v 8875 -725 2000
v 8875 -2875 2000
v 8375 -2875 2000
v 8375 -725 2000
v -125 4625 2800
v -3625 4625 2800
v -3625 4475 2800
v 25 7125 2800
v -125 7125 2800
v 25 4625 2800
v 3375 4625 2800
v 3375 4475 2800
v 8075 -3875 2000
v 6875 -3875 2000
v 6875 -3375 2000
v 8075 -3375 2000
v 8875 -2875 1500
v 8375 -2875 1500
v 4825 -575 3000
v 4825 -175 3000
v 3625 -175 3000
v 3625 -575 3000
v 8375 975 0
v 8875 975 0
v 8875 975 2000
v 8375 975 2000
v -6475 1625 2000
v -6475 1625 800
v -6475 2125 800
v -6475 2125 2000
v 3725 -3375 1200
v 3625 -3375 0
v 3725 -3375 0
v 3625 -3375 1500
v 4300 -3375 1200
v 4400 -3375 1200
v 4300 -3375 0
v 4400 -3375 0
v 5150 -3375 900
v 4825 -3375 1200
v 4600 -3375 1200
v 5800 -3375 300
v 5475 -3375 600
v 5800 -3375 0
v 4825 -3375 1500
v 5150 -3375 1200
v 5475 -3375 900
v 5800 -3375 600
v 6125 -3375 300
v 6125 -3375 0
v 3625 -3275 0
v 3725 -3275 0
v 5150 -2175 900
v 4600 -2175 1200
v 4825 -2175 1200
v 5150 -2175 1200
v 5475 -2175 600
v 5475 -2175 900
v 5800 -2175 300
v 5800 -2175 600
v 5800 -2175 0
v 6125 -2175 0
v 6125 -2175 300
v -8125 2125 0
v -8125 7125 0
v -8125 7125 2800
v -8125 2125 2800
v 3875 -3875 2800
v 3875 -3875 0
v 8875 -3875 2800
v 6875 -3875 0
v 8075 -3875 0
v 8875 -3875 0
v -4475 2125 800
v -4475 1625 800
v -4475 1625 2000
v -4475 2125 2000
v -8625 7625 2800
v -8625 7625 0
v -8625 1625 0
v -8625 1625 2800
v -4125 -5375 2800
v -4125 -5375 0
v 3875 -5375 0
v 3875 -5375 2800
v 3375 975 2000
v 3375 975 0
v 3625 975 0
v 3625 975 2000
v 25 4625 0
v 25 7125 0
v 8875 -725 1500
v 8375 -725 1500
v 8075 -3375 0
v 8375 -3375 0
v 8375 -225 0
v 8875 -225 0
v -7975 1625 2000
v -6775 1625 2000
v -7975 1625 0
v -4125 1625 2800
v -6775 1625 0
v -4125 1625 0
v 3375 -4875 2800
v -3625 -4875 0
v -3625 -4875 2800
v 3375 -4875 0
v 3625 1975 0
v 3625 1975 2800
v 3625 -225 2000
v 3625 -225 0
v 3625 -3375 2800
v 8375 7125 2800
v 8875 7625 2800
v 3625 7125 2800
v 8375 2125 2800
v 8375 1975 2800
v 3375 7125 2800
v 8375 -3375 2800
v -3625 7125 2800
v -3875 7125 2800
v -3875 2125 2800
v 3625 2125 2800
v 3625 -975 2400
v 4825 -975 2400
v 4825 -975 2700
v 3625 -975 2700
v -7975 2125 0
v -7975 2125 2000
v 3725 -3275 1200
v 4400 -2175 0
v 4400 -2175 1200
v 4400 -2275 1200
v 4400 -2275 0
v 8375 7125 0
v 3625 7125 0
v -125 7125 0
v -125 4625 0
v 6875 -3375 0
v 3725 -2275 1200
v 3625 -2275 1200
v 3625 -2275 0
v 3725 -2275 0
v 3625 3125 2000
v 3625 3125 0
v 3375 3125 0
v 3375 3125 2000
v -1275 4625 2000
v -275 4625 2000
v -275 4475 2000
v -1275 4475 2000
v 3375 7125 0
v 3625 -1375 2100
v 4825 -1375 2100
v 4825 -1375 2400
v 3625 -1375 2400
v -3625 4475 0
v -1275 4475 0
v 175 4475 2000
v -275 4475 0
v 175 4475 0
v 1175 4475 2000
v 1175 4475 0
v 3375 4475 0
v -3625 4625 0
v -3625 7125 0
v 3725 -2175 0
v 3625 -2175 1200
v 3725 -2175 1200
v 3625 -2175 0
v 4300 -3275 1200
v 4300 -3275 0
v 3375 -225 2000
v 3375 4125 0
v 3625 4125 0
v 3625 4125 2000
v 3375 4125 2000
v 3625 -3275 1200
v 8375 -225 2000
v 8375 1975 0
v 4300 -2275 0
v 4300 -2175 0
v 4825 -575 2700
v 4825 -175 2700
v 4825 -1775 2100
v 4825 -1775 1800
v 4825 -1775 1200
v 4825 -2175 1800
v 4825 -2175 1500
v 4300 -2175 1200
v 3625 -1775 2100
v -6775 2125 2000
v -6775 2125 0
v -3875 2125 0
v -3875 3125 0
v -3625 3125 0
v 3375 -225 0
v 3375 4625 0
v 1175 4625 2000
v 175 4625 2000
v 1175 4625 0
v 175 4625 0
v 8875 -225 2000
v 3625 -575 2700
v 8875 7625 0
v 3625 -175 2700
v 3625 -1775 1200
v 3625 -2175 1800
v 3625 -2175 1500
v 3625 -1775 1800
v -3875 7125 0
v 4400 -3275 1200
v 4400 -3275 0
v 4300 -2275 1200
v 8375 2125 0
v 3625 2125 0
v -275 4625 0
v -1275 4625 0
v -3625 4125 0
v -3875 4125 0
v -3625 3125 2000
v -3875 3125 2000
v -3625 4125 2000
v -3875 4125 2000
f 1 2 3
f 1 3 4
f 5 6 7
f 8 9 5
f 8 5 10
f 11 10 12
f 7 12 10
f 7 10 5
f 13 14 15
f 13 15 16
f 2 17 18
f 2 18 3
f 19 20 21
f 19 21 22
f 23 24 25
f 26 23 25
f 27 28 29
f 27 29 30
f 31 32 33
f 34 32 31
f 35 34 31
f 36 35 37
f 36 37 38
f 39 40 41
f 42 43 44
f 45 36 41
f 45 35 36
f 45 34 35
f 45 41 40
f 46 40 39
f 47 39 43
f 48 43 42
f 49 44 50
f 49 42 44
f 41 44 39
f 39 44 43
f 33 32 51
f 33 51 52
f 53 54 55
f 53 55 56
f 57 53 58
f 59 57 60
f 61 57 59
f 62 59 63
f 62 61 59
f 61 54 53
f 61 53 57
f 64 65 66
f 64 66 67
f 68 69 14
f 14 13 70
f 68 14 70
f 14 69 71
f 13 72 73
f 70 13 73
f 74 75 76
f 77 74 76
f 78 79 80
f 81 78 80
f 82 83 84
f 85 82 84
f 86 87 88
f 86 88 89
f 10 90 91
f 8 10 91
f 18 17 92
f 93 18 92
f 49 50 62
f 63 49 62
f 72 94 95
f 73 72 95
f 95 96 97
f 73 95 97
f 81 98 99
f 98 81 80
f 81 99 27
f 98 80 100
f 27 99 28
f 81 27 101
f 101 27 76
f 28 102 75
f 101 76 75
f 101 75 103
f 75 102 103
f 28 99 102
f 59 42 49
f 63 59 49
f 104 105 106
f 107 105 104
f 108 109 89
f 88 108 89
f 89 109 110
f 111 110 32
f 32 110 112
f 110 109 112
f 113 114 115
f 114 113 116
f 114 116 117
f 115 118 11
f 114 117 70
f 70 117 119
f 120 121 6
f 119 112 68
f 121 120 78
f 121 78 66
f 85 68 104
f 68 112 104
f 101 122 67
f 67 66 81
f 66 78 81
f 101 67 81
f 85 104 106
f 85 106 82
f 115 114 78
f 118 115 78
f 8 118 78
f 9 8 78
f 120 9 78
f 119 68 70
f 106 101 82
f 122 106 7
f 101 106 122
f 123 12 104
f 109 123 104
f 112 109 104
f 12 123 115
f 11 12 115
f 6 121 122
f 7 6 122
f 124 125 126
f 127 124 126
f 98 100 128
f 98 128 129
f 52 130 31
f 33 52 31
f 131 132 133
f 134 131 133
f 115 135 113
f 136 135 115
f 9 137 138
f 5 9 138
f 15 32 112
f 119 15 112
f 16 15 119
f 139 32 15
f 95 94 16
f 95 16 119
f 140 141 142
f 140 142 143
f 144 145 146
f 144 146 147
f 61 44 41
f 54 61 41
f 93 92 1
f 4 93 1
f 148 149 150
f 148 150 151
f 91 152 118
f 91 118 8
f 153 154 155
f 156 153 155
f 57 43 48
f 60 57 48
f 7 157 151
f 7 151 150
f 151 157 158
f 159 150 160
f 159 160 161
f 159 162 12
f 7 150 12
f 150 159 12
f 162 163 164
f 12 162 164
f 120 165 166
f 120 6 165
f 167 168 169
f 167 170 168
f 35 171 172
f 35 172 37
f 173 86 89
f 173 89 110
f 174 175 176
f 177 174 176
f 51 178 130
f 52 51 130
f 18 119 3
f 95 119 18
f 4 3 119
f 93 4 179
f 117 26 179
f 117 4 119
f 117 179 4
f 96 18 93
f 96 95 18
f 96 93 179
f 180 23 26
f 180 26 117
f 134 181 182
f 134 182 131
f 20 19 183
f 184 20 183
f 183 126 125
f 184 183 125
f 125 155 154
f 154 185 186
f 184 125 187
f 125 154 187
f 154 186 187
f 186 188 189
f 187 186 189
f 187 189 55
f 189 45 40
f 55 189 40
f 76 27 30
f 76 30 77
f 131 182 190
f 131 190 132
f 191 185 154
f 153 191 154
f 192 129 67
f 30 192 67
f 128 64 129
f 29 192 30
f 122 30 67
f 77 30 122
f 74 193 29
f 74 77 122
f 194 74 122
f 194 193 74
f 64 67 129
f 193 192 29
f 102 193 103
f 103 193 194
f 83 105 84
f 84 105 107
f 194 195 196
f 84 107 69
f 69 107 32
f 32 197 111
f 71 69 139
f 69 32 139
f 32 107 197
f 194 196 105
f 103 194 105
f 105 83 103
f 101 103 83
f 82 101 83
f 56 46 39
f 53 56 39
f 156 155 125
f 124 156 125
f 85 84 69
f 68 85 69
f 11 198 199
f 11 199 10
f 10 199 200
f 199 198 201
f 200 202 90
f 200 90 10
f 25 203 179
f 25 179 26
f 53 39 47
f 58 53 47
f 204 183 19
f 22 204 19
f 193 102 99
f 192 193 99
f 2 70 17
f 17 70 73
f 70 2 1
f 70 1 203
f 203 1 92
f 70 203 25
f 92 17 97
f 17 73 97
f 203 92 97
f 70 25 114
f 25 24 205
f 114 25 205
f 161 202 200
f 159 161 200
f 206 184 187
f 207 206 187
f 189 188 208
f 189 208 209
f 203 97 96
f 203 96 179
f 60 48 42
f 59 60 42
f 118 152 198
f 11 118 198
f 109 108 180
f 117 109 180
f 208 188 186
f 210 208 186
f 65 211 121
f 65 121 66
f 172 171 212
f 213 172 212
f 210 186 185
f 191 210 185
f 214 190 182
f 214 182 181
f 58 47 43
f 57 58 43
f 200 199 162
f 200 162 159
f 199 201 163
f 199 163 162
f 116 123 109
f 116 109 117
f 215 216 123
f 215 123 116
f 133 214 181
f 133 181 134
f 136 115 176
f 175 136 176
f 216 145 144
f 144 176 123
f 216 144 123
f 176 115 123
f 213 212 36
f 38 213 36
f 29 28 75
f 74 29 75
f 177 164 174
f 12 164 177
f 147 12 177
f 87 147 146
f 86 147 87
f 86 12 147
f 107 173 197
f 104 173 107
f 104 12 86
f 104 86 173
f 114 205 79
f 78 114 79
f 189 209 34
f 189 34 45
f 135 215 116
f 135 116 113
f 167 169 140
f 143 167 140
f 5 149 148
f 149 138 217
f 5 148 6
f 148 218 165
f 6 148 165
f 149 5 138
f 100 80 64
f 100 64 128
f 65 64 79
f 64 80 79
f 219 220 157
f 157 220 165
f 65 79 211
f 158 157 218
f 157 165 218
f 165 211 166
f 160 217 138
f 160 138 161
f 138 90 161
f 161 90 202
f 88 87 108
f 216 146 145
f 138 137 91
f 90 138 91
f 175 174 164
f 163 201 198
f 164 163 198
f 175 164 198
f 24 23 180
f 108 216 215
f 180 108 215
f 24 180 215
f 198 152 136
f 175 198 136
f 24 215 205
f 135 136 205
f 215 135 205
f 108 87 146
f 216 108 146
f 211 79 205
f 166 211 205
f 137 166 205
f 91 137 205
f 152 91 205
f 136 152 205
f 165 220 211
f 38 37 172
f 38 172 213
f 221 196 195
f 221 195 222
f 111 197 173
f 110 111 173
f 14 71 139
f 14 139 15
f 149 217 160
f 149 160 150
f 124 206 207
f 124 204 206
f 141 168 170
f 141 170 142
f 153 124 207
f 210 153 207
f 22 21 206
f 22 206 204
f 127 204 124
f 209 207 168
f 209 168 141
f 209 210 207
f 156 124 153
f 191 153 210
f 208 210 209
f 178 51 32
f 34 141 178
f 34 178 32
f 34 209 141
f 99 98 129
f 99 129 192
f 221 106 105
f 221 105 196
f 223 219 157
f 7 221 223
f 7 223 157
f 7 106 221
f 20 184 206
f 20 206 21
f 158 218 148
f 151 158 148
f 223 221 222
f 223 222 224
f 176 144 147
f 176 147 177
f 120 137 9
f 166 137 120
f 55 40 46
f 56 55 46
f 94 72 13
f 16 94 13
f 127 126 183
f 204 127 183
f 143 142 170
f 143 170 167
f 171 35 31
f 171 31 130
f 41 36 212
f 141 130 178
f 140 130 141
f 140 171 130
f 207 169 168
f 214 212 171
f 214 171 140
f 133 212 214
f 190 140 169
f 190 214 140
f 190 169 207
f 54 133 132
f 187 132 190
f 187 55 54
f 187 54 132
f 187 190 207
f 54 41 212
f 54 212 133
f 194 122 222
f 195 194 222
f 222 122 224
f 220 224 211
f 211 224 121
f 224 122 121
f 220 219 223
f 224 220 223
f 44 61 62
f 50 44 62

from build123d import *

# Parameters (mm, degrees)
F1_DEPTH  = 2799.9999523163
F3_DEPTH  = 3000
F4_W      = 5000
F4_H      = 2799.9999523163
F5_DEPTH  = 250
F6_W      = 1000
F6_H      = 2000
F7_DEPTH  = 250
F8_W      = 1200
F8_H      = 2000
F9_DEPTH  = 500
F10_W     = 2000
F10_H     = 1200
F11_DEPTH = 500
F12_W     = 10500
F12_H     = 2799.9999523163
F13_DEPTH = 250
F14_W     = 4750
F14_H     = 150
F15_DEPTH = 2800
F16_W     = 1000
F16_H     = 2000
F17_DEPTH = 150
F18_W     = 1000
F18_H     = 2000
F19_DEPTH = 150
F20_W     = 1000
F20_H     = 2000
F21_DEPTH = 250
F22_W     = 1200
F22_H     = 2000
F23_DEPTH = 500
F24_W     = 1200
F24_H     = 2000
F25_DEPTH = 500
F26_W     = 2150
F26_H     = 500
F27_DEPTH = 500
F28_W     = 1200
F28_H     = 2000
F29_DEPTH = 250
F30_W     = 2500
F30_H     = 1200
F31_DEPTH = 1500
F33_DEPTH = 1200
F34_W     = 100
F34_H     = 100
F35_DEPTH = 1400
F36_W     = 1200
F36_H     = 300
F37_DEPTH = 1200
F39_DEPTH = 1200


with BuildPart() as f1:
    # F0 (on Top) → F1 (new body)
    with BuildSketch(Plane.XY):
        Polygon((8875, -3875), (8875, 7625), (-8625, 7625), (-8625, 1625), (-4125, 1625), (-4125, -5375), (3875, -5375), (3875, -3875), align=None)
    extrude(amount=F1_DEPTH)

    # F2 (on Top) → F3 (cut)
    with BuildSketch(Plane.XY):
        Polygon((8375, -3375), (8375, 7125), (-3740.2497768402, 7125), (-8125, 7125), (-8125, 2125), (-3625, 2125), (-3625, -4875), (3375, -4875), (3375, -3375), align=None)
    extrude(amount=F3_DEPTH, mode=Mode.SUBTRACT)

    # F4 (on face) → F5 (join)
    with BuildSketch(Plane.YZ.offset(-3625)):
        with Locations((4625, 1399.9999761581)):
            Rectangle(F4_W, F4_H)
    extrude(amount=-F5_DEPTH)

    # F6 (on face) → F7 (cut, through all)
    with BuildSketch(Plane.YZ.offset(-3625)):
        with Locations((3625, 1000)):
            Rectangle(F6_W, F6_H)
    extrude(amount=-F7_DEPTH, mode=Mode.SUBTRACT)

    # F8 (on face) → F9 (cut, through all)
    with BuildSketch(Plane.XZ.offset(-1625)):
        with Locations((-7375, 1000)):
            Rectangle(F8_W, F8_H)
    extrude(amount=-F9_DEPTH, mode=Mode.SUBTRACT)

    # F10 (on face) → F11 (cut, through all)
    with BuildSketch(Plane.XZ.offset(-1625)):
        with Locations((-5475, 1400)):
            Rectangle(F10_W, F10_H)
    extrude(amount=-F11_DEPTH, mode=Mode.SUBTRACT)

    # F12 (on face) → F13 (join)
    with BuildSketch(Plane(origin=(3375, 0, 0), x_dir=(0, -1, 0), z_dir=(-1, 0, 0))):
        with Locations((-1875, 1399.9999761581)):
            Rectangle(F12_W, F12_H)
    extrude(amount=-F13_DEPTH)

    # F14 (on face) → F15 (join)
    with BuildSketch(Plane.XY):
        Polygon((3375, 4475), (3375, 4625), (25, 4625), (25, 7125), (-125, 7125), (-125, 4625), (-3625, 4625), (-3625, 4475), align=None)
        with Locations((6000, 2050)):
            Rectangle(F14_W, F14_H)
    extrude(amount=F15_DEPTH)

    # F16 (on face) → F17 (cut, through all)
    with BuildSketch(Plane(origin=(0, 4625, 0), x_dir=(-1, 0, 0), z_dir=(0, 1, 0))):
        with Locations((775, 1000)):
            Rectangle(F16_W, F16_H)
    extrude(amount=-F17_DEPTH, mode=Mode.SUBTRACT)

    # F18 (on face) → F19 (cut, through all)
    with BuildSketch(Plane(origin=(0, 4625, 0), x_dir=(-1, 0, 0), z_dir=(0, 1, 0))):
        with Locations((-675, 1000)):
            Rectangle(F18_W, F18_H)
    extrude(amount=-F19_DEPTH, mode=Mode.SUBTRACT)

    # F20 (on face) → F21 (cut, through all)
    with BuildSketch(Plane.YZ.offset(3625)):
        with Locations((3625, 1000)):
            Rectangle(F20_W, F20_H)
    extrude(amount=-F21_DEPTH, mode=Mode.SUBTRACT)

    # F22 (on face) → F23 (cut, through all)
    with BuildSketch(Plane.XZ.offset(3875)):
        with Locations((7475, 1000)):
            Rectangle(F22_W, F22_H)
    extrude(amount=-F23_DEPTH, mode=Mode.SUBTRACT)

    # F24 (on face) → F25 (cut, through all)
    with BuildSketch(Plane.YZ.offset(8875)):
        with Locations((375, 1000)):
            Rectangle(F24_W, F24_H)
    extrude(amount=-F25_DEPTH, mode=Mode.SUBTRACT)

    # F26 (on face) → F27 (cut, through all)
    with BuildSketch(Plane.YZ.offset(8875)):
        with Locations((-1800, 1750)):
            Rectangle(F26_W, F26_H)
    extrude(amount=-F27_DEPTH, mode=Mode.SUBTRACT)

    # F28 (on face) → F29 (cut, through all)
    with BuildSketch(Plane(origin=(3375, 0, 0), x_dir=(0, -1, 0), z_dir=(-1, 0, 0))):
        with Locations((-375, 1000)):
            Rectangle(F28_W, F28_H)
    extrude(amount=-F29_DEPTH, mode=Mode.SUBTRACT)


with BuildPart() as f31:
    # F30 (on face) → F31 (new body)
    with BuildSketch(Plane.XY):
        with Locations((4875, -2775)):
            Rectangle(F30_W, F30_H)
    extrude(amount=F31_DEPTH)

    # F32 (on face) → F33 (cut, through all)
    with BuildSketch(Plane.XZ.offset(3375)):
        Polygon((6125, 300), (6125, 1500), (4825, 1500), (4825, 1200), (5150, 1200), (5150, 900), (5475, 900), (5475, 600), (5800, 600), (5800, 300), align=None)
        Polygon((3625, 1400), (3625, 0), (5800, 0), (4400, 1400), align=None)
    extrude(amount=-F33_DEPTH, mode=Mode.SUBTRACT)

    # F34 (on face) → F35 (join)
    with BuildSketch(Plane(origin=(0, 0, 1400), x_dir=(1, 0, 0), z_dir=(0, 0, -1))):
        with Locations((3675, 3325)):
            Rectangle(F34_W, F34_H)
        with Locations((3675, 2225)):
            Rectangle(F34_W, F34_H)
        with Locations((4350, 2225)):
            Rectangle(F34_W, F34_H)
        with Locations((4350, 3325)):
            Rectangle(F34_W, F34_H)
    extrude(amount=F35_DEPTH)

    # F36 (on face) → F37 (join)
    with BuildSketch(Plane.YZ.offset(4825)):
        with Locations((-2775, 1350)):
            Rectangle(F36_W, F36_H)
        Polygon((-2175, 1500), (-2175, 1200), (-175, 1200), (-175, 3000), (-2175, 3000), align=None)
    extrude(amount=-F37_DEPTH)

    # F38 (on face) → F39 (cut)
    with BuildSketch(Plane.YZ.offset(4825)):
        Polygon((-575, 3000), (-2175, 3000), (-2175, 1800), (-1775, 1800), (-1775, 2100), (-1375, 2100), (-1375, 2400), (-975, 2400), (-975, 2700), (-575, 2700), align=None)
        Polygon((-1775, 1200), (-175, 1200), (-175, 2700), align=None)
    extrude(amount=-F39_DEPTH, mode=Mode.SUBTRACT)


solid = Compound([f1.part, f31.part])
